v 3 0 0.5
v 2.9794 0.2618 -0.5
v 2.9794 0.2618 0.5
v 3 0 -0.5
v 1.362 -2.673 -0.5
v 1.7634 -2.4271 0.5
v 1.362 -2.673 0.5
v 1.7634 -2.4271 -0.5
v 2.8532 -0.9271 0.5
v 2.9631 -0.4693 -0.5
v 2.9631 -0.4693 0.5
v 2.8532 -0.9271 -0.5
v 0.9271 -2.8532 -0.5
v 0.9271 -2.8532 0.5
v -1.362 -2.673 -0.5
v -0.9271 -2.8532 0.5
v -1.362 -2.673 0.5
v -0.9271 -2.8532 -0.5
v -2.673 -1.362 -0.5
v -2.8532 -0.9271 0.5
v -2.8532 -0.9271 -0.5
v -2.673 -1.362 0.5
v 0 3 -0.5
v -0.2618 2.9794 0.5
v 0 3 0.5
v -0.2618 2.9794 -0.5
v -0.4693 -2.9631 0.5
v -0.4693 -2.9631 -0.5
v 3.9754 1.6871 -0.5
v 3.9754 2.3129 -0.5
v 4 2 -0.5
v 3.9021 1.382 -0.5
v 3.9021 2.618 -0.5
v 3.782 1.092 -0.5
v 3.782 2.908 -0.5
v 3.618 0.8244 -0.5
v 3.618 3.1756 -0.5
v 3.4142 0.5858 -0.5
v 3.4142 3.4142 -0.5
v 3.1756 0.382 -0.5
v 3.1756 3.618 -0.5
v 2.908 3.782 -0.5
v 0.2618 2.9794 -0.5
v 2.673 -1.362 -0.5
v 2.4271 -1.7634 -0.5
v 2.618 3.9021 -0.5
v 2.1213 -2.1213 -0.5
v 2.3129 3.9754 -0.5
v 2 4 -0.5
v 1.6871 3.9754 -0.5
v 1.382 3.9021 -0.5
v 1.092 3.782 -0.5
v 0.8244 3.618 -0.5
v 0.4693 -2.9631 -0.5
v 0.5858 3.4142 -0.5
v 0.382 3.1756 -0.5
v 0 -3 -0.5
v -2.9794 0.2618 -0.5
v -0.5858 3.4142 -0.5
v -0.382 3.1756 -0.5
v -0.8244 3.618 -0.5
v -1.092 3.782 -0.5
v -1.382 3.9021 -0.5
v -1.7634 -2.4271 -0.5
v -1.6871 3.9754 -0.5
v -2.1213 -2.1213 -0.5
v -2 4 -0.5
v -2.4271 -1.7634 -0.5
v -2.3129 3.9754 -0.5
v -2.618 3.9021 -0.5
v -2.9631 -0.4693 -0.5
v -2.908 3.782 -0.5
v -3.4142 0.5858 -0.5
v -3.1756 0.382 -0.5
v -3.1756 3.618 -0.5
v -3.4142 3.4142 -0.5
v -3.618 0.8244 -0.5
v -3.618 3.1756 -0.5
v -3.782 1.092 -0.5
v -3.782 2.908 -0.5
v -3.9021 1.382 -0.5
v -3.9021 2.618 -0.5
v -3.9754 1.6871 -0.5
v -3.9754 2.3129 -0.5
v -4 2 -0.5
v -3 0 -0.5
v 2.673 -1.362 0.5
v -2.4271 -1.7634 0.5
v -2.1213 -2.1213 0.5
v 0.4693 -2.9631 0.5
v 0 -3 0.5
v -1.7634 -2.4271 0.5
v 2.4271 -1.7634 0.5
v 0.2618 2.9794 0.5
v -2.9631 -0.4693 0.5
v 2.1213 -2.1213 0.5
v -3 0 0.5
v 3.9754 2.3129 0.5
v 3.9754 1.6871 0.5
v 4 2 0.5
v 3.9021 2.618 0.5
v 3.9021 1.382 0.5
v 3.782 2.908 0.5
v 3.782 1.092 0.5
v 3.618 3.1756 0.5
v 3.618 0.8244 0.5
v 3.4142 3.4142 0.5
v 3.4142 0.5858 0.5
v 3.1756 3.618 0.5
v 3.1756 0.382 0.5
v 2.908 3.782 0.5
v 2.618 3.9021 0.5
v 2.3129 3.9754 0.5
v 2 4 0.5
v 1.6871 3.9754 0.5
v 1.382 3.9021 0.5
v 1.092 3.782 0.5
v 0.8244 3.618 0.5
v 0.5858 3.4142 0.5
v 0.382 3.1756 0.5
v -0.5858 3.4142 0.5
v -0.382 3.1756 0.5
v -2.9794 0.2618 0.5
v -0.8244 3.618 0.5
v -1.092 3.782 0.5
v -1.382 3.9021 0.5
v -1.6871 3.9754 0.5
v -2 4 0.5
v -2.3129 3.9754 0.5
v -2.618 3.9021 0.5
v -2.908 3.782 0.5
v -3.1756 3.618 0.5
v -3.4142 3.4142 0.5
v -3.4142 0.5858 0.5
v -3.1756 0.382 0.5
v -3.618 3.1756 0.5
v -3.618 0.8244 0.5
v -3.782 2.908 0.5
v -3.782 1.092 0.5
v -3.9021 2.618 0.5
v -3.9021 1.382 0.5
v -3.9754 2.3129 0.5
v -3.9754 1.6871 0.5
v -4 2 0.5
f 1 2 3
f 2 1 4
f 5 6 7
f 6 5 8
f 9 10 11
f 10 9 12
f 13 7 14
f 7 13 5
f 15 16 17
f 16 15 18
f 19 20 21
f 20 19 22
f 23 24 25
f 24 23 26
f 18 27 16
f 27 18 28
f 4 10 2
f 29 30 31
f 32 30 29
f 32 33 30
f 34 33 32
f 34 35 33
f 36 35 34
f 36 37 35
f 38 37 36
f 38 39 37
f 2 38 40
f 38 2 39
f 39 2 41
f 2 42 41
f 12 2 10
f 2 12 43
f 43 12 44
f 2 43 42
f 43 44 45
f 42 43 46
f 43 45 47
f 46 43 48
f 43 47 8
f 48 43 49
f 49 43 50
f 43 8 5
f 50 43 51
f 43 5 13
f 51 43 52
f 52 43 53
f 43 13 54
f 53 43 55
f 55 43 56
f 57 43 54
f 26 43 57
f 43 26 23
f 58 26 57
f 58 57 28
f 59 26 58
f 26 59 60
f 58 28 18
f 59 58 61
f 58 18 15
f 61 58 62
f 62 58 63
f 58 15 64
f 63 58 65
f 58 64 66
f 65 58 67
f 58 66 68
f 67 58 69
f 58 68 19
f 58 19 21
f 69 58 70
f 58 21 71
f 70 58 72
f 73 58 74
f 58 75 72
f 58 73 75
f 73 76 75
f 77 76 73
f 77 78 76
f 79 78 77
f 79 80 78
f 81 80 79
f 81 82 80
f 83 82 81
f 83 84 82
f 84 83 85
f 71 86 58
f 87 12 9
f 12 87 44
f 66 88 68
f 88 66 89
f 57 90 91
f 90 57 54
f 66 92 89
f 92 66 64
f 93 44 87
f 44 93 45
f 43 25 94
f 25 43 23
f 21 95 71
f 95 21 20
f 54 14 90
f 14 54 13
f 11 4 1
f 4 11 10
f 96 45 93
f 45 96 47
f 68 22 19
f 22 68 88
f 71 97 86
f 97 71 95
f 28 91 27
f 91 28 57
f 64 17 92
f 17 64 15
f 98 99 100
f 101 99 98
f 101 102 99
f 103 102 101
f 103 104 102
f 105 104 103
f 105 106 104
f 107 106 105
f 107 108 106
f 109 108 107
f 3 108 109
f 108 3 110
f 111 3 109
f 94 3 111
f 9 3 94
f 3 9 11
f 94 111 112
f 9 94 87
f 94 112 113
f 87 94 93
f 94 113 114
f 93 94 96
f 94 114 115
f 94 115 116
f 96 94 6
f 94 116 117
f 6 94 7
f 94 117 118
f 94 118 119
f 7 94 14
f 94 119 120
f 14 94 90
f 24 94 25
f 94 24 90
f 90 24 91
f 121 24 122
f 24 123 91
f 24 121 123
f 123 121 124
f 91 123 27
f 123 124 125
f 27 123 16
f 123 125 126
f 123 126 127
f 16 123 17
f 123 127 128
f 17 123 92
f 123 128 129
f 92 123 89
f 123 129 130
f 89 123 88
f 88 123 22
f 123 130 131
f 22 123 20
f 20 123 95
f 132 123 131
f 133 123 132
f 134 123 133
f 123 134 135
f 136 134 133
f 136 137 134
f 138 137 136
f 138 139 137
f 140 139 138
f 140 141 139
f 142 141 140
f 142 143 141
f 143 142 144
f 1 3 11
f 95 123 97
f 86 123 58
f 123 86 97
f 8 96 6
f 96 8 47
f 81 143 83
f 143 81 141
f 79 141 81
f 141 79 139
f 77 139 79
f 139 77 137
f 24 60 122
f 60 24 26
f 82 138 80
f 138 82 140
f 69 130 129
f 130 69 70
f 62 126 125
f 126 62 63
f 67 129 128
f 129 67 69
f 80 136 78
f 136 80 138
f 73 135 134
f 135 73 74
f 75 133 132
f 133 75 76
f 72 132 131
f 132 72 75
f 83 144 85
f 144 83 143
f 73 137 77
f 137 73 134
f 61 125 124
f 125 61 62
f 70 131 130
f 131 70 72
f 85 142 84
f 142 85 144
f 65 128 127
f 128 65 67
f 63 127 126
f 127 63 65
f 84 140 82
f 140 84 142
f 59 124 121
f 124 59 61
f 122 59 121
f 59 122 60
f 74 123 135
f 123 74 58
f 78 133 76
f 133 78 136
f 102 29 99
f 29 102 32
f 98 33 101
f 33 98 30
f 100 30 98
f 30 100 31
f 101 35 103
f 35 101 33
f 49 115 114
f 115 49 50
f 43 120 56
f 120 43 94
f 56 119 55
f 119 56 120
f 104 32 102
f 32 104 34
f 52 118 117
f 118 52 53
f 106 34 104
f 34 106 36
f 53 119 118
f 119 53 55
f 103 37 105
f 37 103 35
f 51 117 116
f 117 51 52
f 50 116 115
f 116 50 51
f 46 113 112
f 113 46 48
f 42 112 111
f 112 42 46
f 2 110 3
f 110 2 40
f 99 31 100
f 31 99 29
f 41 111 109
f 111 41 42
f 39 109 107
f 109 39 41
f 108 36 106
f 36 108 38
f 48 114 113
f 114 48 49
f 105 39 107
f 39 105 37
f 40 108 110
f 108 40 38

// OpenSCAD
//Author: Chris Correll
//Date: 10/1/2022
//Description: 2-1 parameterization assignment solutions

$fn = 40;

//Have students read through the example (it should be in the student file) and change paramets notice how the model grows and retains its over all structure. Notice the descriptive varible names. 

//Make a parameterized mickey mouse shape
face_size = 6;
ear_size = 4;
thickness = 1;

cylinder(h = thickness, d = face_size, center = true);
translate([-face_size/3, face_size/3, 0])
cylinder(h = thickness, d = ear_size, center = true);
translate([face_size/3, face_size/3, 0])
cylinder(h = thickness, d = ear_size, center = true);


//PROBLEM
//Choose a model from Lesson 1-0 and 1-1 (top, stair case, yo-yo) and parameterize it. Every parameter you use should have a descriptive name and you should be able to change the whole model correctly by chaning the parameters. 
//Have students think about what parameters they would like to use before programming the model. Have them first copy and paste the code from lesson 1-0 or lesson 1-1 into their file and read it over thinking about what they would want to be represented by a variable and how different dimensions of their object could be represented in terms of that variable. Could any variable or dimension be represented as a porportion of another variable? Objects can be parameterized in many different ways its good practice to try to minimize your number of editable parameters by defining paremeters interms of other variables this makes things easier to modify, but harder to code! Its helpful to add comments after your parameters so you or someone else will know what you are thinking!
//Optional: Have students pair up (use audio splitters in the desk drawer so they can both hear the code if necessary) and try to program the most efficient parameterized model together!

/*
//Possible Solutions
//Make a yo-yo
h_yo_yo = 30;
w_yo_yo = 40;
translate([0,0,-h_yo_yo/20])
cylinder(h=h_yo_yo/2, d1=w_yo_yo, d2=0, center=true);
translate([0,0,h_yo_yo/20])
cylinder(h=h_yo_yo/2, d1=0, d2=w_yo_yo, center=true);


//Make a top
h_top = 5000;

h_spinner = 1/2 * h_top;
h_handle = 1/2 * h_top;

w_top = 3*h_top/2; //150% height of top
w_handle = w_top/10; // 10% width of top
 
cylinder(d1=.1,d2=w_top,h=h_spinner,center=true); //dont set d1 to 0 so we can 3d print it facing down otherwise first layer has no geometry (ie cant have a 0 dimension layer in real world)
cylinder(d = w_handle,h=h_handle);


//Make a parametereized stair step 
//Solution 1
h_stair_case = 40;
l_stair_case = 40;
w_stair_case = 50;

h_stair = h_stair_case/4;
l_stair = l_stair_case/4;

cube([l_stair*4,w_stair_case,h_stair*1]); //Step 1
cube([l_stair*3,w_stair_case,h_stair*2]); //Step 2
cube([l_stair*2,w_stair_case,h_stair*3]); //Step 3
cube([l_stair*1,w_stair_case,h_stair*4]); //Step 4


//Another Solution...
h_stair_case = 40;
l_stair_case = 40;
w_stair_case = 50;

h_stair = h_stair_case/4;
l_stair = l_stair_case/4;

cube([l_stair*4,w_stair_case,h_stair]); //Step 1

translate([l_stair,0,h_stair])
cube([l_stair*3,w_stair_case,h_stair]); //Step 2

translate([l_stair*2,0,h_stair*2])
cube([l_stair*2,w_stair_case,h_stair]); //Step 3

translate([l_stair*3,0,h_stair*3])
cube([l_stair,w_stair_case,h_stair]); //Step 4
*/
